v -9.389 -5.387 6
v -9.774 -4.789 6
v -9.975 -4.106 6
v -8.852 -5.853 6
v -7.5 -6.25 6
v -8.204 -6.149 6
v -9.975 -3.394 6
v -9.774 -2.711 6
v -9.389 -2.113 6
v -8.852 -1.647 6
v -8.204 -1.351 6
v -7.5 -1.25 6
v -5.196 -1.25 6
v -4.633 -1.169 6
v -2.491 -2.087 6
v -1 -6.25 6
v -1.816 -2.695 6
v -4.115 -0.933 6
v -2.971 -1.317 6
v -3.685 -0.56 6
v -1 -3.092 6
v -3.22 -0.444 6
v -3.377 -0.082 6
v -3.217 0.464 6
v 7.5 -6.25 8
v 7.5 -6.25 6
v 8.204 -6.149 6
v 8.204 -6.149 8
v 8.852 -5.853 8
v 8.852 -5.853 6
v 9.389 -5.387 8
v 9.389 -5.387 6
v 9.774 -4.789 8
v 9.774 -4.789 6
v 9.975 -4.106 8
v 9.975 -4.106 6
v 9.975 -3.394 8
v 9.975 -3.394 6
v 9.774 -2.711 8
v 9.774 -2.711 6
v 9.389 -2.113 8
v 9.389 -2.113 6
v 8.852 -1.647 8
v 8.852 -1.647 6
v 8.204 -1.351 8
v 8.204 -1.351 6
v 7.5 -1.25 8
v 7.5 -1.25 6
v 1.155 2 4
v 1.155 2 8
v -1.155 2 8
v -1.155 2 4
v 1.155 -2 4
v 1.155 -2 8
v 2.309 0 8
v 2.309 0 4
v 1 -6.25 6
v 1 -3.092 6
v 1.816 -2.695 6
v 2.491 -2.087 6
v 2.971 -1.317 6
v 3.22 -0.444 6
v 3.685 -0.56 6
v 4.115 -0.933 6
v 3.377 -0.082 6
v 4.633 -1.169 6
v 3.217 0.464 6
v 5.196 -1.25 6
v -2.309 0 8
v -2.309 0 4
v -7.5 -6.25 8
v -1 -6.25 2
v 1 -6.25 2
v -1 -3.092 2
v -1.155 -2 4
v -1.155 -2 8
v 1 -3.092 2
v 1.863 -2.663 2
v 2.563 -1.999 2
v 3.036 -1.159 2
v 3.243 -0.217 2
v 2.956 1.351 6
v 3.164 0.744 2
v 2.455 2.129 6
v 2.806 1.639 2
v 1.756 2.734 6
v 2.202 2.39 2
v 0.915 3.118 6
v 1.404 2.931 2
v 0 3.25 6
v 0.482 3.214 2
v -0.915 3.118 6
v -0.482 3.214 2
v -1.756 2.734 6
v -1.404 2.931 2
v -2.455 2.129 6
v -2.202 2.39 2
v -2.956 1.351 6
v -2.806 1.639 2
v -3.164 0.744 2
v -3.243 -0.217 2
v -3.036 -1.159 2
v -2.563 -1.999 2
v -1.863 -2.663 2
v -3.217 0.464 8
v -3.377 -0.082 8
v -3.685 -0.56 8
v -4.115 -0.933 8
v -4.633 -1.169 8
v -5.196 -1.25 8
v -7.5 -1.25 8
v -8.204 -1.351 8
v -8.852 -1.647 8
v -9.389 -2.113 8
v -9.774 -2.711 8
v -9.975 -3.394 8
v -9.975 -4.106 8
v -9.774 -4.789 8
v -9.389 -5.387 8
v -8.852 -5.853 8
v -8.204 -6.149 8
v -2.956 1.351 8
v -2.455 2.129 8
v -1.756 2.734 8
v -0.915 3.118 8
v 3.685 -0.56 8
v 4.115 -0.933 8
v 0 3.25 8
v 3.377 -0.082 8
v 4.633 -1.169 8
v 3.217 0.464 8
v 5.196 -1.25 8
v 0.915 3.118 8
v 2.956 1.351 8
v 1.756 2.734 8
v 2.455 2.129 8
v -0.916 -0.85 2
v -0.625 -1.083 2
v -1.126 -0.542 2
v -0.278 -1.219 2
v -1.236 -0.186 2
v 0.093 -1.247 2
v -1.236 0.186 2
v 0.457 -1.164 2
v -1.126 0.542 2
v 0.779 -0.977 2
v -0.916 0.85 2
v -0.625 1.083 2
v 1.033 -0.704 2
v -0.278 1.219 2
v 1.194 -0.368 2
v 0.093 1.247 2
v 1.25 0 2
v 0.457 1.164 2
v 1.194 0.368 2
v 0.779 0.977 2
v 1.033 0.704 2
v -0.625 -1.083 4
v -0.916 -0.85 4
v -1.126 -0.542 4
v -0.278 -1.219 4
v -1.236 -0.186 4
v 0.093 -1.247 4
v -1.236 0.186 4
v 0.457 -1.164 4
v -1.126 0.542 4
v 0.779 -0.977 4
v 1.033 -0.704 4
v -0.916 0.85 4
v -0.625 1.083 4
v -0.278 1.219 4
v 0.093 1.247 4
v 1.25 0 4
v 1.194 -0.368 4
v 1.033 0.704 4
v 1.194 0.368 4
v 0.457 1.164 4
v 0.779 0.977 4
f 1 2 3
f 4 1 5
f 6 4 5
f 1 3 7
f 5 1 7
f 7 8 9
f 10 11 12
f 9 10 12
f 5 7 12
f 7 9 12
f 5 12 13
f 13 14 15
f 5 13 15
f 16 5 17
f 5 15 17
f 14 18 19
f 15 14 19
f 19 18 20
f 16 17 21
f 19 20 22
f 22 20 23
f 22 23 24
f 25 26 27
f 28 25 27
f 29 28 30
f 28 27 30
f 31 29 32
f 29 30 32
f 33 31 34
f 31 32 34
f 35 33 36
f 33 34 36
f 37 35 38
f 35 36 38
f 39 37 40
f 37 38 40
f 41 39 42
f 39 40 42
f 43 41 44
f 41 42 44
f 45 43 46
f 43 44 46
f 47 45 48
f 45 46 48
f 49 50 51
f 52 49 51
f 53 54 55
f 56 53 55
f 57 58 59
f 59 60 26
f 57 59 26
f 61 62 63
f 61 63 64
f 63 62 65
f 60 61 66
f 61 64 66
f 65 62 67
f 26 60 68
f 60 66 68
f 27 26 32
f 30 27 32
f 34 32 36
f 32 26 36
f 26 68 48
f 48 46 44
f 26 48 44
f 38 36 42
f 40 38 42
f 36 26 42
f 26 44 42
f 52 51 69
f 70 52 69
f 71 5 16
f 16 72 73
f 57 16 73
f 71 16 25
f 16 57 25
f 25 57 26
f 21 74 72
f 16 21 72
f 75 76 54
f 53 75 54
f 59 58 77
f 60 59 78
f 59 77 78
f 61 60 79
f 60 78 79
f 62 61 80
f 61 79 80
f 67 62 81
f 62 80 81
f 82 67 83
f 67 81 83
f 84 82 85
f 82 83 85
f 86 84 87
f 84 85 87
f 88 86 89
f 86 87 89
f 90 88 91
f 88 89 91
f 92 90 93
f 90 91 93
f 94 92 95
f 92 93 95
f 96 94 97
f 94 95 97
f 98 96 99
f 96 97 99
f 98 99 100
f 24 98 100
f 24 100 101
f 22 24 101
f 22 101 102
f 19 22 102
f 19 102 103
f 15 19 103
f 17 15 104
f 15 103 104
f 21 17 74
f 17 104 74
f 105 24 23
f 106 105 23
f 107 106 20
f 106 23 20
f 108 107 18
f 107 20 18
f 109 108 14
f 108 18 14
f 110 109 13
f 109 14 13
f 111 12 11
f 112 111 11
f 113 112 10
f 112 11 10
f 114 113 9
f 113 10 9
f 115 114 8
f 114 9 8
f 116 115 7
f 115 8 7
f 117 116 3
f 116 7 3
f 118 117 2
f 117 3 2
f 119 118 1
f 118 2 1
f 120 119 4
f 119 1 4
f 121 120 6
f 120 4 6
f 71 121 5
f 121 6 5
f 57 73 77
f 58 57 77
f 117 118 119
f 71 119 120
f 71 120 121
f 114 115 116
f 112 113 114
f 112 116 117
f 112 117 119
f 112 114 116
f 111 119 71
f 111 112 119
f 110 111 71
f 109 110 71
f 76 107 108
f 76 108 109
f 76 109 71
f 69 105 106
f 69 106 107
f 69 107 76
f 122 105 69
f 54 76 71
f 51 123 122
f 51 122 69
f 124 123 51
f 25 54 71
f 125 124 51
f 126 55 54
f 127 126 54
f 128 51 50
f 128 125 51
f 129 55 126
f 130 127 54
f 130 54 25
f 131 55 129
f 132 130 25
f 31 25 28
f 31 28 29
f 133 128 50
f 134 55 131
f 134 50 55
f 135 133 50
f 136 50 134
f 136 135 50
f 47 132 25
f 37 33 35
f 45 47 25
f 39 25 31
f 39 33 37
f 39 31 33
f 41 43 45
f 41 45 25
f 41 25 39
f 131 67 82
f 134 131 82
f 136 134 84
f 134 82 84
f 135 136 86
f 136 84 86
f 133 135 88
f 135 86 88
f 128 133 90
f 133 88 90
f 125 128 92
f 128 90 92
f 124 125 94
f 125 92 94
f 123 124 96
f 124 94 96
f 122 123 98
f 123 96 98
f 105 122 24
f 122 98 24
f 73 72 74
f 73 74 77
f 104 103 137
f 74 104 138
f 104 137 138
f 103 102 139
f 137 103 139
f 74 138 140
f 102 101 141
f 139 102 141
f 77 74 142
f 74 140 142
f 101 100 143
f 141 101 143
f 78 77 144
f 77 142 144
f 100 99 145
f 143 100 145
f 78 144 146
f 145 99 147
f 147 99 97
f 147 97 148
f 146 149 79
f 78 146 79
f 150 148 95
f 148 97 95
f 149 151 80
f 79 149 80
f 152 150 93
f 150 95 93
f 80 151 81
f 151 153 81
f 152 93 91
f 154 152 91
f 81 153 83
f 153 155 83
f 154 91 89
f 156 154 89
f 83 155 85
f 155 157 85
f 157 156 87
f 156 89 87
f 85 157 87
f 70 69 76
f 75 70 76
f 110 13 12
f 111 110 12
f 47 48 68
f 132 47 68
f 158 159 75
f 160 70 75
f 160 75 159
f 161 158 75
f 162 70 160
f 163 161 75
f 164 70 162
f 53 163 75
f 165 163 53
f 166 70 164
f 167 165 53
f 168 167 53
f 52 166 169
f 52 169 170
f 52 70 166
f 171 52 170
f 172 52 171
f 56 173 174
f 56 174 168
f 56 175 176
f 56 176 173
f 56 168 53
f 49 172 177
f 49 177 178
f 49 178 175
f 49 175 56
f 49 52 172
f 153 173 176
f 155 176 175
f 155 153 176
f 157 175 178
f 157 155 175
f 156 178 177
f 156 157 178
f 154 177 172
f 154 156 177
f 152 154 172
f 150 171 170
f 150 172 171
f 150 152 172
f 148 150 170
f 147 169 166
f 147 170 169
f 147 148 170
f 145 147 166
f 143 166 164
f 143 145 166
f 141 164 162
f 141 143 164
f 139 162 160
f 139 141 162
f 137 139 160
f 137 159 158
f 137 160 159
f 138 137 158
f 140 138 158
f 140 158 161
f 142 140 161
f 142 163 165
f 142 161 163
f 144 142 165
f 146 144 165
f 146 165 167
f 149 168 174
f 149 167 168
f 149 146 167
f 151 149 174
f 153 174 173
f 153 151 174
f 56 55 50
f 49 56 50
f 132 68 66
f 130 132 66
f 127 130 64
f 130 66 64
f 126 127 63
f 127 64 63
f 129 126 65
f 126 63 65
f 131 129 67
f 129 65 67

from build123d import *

# Parameters (mm, degrees)
SKETCH1_R           = 1.25
BOSS_EXTRUDE1_DEPTH = 2
BOSS_EXTRUDE2_DEPTH = 4
FILLET1_R           = 2
SKETCH3_R           = 1.25
BOSS_EXTRUDE3_DEPTH = 4
BOSS_EXTRUDE4_DEPTH = 2
CUT_EXTRUDE1_DEPTH  = 4


with BuildPart() as part:
    # Sketch1 → Boss-Extrude1 (new body)
    with BuildSketch(Plane.XY):
        with BuildLine():
            Line((-7.5, -1.25), (-3, -1.25))
            ThreePointArc((-3, -1.25), (0, 3.25), (3, -1.25))
            Line((3, -1.25), (7.5, -1.25))
            ThreePointArc((7.5, -1.25), (10, -3.75), (7.5, -6.25))
            Line((7.5, -6.25), (-7.5, -6.25))
            ThreePointArc((-7.5, -6.25), (-10, -3.75), (-7.5, -1.25))
        make_face()
        Circle(SKETCH1_R, mode=Mode.SUBTRACT)
    extrude(amount=BOSS_EXTRUDE1_DEPTH)

    # Sketch2 → Boss-Extrude2 (add)
    with BuildSketch(Plane.XY.offset(2)):
        with BuildLine():
            Line((-8, -6.199489743), (-8, -1.300510257))
            ThreePointArc((-8, -1.300510257), (-10, -3.75), (-8, -6.199489743))
        make_face()
        with BuildLine():
            ThreePointArc((3, -1.703672504), (0, -3.45), (-3, -1.703672504))
            Line((-3, -1.703672504), (-3, -6.25))
            Line((-3, -6.25), (3, -6.25))
            Line((3, -6.25), (3, -1.703672504))
        make_face()
        with BuildLine():
            ThreePointArc((8, -6.199489743), (10, -3.75), (8, -1.300510257))
            Line((8, -1.300510257), (8, -6.199489743))
        make_face()
    extrude(amount=BOSS_EXTRUDE2_DEPTH)

    # Fillet1
    fillet1_edges = [part.edges().sort_by_distance(p)[0] for p in [
        (3, -1.25, 1),
        (-3, -1.25, 1),
    ]]
    fillet(fillet1_edges, radius=FILLET1_R)


with BuildPart() as body_2:
    # Sketch3 → Boss-Extrude3 (new body)
    with BuildSketch(Plane.XY.offset(2)):
        with BuildLine():
            Line((-1, -3.092329219), (-1, -6.25))
            Line((-1, -6.25), (1, -6.25))
            Line((1, -6.25), (1, -3.092329219))
            ThreePointArc((1, -3.092329219), (0, 3.25), (-1, -3.092329219))
        make_face()
        Circle(SKETCH3_R, mode=Mode.SUBTRACT)
    extrude(amount=BOSS_EXTRUDE3_DEPTH)

    # Sketch4 → Boss-Extrude4 (add)
    with BuildSketch(Plane.XY.offset(6)):
        with BuildLine():
            Line((7.5, -1.25), (5.196152423, -1.25))
            ThreePointArc((5.196152423, -1.25), (3.886845081, -0.761857892), (3.216665785, 0.464285714))
            ThreePointArc((3.216665785, 0.464285714), (0, 3.25), (-3.216665785, 0.464285714))
            ThreePointArc((-3.216665785, 0.464285714), (-3.886845081, -0.761857892), (-5.196152423, -1.25))
            Line((-5.196152423, -1.25), (-7.5, -1.25))
            ThreePointArc((-7.5, -1.25), (-10, -3.75), (-7.5, -6.25))
            Line((-7.5, -6.25), (7.5, -6.25))
            ThreePointArc((7.5, -6.25), (10, -3.75), (7.5, -1.25))
        make_face()
    extrude(amount=BOSS_EXTRUDE4_DEPTH)

    # Sketch5 → Cut-Extrude1 (cut)
    with BuildSketch(Plane.XY.offset(8)):
        Polygon((1.154700538, 2), (-1.154700538, 2), (-2.309401077, 0), (-1.154700538, -2), (1.154700538, -2), (2.309401077, 0), align=None)
    extrude(amount=-CUT_EXTRUDE1_DEPTH, mode=Mode.SUBTRACT)


solid = body_2.part
